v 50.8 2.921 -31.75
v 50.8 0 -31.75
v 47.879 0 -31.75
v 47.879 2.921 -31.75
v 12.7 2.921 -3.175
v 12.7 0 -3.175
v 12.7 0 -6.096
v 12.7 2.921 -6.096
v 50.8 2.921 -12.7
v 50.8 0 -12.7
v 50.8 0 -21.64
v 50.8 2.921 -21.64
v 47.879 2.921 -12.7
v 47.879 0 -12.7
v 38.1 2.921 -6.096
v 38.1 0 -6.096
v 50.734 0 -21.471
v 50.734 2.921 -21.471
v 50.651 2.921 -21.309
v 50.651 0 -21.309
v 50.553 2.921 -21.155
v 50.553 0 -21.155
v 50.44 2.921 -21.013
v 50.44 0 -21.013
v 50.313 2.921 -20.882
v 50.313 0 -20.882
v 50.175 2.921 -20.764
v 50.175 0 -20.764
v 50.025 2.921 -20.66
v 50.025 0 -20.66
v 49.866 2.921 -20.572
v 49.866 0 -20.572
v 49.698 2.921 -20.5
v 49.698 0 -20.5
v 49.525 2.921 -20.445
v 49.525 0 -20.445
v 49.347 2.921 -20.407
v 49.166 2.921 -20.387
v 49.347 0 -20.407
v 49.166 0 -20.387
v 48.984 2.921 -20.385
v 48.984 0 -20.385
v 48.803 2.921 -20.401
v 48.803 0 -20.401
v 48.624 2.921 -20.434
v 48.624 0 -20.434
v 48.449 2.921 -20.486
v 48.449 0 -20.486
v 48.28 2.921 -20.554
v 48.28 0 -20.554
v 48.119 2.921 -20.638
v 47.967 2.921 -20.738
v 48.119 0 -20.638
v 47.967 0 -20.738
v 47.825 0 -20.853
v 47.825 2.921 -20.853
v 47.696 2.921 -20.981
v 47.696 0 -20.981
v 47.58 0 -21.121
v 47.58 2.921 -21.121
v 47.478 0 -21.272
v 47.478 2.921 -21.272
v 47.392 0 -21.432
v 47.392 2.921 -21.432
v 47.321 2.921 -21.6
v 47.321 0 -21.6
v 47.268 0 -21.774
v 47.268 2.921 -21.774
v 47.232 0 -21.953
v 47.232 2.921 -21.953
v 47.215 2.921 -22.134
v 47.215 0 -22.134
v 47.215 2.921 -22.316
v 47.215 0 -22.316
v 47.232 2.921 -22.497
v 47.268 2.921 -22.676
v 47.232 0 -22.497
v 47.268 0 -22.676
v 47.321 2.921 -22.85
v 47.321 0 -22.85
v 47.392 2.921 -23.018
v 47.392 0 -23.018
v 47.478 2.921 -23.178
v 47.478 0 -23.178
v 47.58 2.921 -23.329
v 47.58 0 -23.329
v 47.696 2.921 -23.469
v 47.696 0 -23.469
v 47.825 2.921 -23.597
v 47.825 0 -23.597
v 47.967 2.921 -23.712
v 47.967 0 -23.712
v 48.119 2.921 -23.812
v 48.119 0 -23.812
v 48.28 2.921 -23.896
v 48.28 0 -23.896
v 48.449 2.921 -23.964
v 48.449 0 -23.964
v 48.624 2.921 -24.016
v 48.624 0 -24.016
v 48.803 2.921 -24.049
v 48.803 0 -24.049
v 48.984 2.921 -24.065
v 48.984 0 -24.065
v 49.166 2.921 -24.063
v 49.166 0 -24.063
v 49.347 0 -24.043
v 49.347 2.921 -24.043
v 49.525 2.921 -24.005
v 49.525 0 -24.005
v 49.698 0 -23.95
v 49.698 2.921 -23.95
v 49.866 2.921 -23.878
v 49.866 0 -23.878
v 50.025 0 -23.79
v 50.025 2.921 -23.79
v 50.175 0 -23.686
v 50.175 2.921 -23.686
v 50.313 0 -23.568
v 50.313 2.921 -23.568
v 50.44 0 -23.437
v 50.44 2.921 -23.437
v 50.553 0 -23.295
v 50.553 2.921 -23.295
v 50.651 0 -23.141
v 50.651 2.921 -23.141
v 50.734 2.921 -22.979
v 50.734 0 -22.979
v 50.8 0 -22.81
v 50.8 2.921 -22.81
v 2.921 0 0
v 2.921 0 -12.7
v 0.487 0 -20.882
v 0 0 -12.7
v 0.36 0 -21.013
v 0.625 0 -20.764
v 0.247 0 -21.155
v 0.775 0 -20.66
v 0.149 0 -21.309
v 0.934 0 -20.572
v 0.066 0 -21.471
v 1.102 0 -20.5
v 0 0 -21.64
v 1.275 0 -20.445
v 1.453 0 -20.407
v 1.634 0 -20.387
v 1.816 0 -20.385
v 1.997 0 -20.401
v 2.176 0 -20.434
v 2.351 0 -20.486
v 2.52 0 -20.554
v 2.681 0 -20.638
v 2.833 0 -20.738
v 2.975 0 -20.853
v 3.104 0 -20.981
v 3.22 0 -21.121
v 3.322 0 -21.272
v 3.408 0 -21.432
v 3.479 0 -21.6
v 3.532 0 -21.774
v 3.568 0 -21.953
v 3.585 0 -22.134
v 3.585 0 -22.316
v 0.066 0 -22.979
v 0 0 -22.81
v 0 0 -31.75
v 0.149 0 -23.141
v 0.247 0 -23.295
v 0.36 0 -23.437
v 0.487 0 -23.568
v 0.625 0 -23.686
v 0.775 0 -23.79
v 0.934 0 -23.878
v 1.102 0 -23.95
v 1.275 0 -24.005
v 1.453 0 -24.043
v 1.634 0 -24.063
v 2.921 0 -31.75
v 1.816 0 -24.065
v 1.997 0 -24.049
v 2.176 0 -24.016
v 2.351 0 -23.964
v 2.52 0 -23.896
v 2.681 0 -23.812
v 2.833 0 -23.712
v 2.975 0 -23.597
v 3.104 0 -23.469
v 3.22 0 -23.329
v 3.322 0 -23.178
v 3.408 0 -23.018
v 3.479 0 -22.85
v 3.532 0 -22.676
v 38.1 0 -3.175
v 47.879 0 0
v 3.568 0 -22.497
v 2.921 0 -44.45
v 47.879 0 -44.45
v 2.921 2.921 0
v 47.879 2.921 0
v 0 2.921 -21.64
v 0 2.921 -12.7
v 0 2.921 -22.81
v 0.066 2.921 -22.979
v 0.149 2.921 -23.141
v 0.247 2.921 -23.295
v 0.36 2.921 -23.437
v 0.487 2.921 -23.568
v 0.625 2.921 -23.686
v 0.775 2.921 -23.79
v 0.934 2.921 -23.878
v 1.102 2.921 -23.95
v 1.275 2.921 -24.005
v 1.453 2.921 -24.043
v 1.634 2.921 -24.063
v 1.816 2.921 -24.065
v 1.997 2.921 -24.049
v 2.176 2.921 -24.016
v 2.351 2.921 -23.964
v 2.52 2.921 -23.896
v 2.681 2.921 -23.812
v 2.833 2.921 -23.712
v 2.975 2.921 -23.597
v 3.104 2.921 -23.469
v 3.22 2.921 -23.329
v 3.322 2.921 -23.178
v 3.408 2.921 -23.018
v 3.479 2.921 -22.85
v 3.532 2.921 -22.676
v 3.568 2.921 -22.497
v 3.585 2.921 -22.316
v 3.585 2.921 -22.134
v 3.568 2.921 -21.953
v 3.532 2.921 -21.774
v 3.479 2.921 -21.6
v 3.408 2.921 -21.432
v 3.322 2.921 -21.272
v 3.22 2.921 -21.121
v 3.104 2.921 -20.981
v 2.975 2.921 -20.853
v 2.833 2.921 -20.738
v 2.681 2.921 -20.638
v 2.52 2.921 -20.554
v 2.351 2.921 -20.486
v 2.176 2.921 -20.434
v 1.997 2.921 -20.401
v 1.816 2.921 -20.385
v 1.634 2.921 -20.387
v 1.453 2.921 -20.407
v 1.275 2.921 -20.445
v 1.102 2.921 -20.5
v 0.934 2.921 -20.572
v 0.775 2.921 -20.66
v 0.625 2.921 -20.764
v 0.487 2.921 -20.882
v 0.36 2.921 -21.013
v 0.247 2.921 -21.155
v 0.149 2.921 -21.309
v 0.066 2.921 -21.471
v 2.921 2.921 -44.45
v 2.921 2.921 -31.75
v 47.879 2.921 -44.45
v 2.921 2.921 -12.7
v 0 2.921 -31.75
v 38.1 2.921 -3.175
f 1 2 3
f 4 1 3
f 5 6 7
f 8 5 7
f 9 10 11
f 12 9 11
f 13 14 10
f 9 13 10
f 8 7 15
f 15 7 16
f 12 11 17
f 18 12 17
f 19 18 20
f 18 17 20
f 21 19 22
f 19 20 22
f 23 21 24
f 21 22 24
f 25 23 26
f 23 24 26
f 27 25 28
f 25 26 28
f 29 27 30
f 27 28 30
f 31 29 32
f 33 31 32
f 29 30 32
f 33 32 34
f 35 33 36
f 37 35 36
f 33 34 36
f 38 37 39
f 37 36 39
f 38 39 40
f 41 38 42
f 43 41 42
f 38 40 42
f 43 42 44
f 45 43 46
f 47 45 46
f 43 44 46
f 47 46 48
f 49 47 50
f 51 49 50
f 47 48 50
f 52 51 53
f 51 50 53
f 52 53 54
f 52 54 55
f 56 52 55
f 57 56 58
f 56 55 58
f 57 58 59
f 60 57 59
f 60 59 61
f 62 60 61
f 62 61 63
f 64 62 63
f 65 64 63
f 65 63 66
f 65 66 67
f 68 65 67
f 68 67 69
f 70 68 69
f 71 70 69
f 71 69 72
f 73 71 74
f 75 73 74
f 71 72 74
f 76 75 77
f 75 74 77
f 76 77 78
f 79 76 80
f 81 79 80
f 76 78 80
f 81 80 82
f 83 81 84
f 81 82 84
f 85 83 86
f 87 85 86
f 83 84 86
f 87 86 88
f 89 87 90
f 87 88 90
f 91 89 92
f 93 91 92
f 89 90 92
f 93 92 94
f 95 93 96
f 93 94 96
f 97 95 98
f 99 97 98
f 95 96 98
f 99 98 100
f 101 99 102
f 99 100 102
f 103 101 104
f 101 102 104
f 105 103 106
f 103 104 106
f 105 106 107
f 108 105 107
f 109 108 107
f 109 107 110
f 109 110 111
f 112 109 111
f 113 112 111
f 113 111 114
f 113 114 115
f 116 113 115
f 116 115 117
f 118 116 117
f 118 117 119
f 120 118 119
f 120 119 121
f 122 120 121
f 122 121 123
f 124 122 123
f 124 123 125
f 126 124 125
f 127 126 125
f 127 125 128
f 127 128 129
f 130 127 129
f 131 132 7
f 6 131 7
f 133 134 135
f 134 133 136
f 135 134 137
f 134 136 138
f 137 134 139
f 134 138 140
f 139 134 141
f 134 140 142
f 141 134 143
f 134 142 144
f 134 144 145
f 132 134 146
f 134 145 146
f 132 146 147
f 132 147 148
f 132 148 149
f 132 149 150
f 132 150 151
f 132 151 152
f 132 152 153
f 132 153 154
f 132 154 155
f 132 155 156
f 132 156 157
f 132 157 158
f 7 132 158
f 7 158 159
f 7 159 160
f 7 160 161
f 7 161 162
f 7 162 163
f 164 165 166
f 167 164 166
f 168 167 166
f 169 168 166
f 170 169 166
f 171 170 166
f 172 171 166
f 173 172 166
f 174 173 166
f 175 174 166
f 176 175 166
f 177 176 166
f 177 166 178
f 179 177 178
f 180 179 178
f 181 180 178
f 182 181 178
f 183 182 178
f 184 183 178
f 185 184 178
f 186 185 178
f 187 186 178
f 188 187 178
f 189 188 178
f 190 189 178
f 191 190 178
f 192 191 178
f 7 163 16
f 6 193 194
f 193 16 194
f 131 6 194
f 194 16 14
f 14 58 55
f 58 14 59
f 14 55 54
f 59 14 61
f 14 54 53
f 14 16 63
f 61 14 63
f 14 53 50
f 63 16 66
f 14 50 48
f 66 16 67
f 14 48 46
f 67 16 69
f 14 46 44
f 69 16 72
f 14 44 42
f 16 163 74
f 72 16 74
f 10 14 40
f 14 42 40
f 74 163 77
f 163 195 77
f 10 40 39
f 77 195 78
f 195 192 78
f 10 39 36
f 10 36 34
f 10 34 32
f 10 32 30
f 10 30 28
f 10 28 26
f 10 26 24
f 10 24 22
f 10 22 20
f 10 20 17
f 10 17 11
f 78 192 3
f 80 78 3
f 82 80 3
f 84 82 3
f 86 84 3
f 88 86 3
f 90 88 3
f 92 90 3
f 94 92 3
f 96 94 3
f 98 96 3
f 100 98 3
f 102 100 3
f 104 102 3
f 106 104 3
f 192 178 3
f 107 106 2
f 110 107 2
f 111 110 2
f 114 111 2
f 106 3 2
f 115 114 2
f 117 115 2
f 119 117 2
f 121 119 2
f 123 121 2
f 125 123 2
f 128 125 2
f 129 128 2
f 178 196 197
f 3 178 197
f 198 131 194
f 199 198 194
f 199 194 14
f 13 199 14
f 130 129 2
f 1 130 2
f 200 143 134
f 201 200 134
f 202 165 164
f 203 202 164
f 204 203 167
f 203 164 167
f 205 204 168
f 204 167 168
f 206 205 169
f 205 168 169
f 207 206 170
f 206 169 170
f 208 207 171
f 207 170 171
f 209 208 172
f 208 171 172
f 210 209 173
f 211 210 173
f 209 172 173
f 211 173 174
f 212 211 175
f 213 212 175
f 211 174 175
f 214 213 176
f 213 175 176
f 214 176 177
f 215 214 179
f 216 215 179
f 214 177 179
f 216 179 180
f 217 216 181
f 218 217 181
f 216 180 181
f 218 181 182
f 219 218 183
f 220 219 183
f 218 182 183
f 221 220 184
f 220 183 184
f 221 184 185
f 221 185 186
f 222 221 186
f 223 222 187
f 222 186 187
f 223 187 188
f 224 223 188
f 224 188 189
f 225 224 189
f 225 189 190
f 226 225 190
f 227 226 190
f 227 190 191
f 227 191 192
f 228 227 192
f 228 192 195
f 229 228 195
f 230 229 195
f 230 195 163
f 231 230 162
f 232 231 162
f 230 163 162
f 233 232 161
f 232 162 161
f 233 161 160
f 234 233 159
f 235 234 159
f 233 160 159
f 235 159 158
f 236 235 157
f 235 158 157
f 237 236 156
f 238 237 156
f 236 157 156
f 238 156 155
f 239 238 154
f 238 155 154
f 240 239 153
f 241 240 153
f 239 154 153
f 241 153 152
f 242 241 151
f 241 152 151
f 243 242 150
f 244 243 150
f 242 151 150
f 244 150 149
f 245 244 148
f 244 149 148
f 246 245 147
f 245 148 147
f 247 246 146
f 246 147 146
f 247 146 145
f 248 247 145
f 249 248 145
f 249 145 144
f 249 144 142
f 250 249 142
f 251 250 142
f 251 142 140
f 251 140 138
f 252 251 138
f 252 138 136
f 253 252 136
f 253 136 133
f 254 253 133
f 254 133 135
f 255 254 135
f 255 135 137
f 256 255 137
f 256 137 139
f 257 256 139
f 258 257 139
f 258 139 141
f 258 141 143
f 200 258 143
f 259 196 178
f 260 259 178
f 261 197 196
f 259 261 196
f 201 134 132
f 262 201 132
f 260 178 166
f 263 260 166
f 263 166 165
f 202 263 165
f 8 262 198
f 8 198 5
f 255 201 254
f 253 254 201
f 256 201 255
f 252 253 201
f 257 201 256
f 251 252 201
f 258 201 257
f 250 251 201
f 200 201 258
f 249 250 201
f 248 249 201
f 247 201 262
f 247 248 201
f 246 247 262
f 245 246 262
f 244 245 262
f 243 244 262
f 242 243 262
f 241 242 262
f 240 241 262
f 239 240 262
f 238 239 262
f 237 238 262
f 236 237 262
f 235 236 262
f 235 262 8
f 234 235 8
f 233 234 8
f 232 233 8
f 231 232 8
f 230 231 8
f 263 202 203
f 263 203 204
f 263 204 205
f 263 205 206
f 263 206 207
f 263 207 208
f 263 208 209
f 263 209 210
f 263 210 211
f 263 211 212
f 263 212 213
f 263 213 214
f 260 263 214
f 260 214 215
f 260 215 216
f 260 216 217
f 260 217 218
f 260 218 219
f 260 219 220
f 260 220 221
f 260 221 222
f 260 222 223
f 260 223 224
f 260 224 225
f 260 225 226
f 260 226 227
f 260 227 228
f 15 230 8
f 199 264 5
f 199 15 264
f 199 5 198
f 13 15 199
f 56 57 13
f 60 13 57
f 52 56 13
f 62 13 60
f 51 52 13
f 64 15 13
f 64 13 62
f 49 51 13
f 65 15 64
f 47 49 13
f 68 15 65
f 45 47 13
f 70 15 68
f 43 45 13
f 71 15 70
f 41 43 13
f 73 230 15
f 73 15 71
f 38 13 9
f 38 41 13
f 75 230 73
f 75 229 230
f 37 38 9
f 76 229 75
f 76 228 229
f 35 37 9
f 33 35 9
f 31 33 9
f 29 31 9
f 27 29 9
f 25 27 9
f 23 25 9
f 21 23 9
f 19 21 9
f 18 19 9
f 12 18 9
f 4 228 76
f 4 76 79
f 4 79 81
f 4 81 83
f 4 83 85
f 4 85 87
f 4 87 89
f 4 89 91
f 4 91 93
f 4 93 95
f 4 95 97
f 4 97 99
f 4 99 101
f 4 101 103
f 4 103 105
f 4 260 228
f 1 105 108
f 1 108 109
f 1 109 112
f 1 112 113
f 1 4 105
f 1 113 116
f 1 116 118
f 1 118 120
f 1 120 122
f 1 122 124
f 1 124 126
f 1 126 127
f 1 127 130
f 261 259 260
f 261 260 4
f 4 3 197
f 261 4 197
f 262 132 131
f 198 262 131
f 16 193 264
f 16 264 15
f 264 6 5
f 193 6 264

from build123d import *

# Parameters (mm, degrees)
SKETCH1_W           = 25.4
SKETCH1_H           = 2.921
BOSS_EXTRUDE1_DEPTH = 2.921


with BuildPart() as part:
    # Sketch1 → Boss-Extrude1 (new body)
    with BuildSketch(Plane(origin=(0, 0, 0), x_dir=(1, 0, 0), z_dir=(0, 1, 0))):
        with BuildLine():
            Line((2.921, 0), (47.879, 0))
            Line((47.879, 0), (47.879, 12.7))
            Line((47.879, 12.7), (50.8, 12.7))
            Line((50.8, 12.7), (50.8, 21.640420504))
            ThreePointArc((50.8, 21.640420504), (47.21225, 22.225), (50.8, 22.809579496))
            Line((50.8, 22.809579496), (50.8, 31.75))
            Line((50.8, 31.75), (47.879, 31.75))
            Line((47.879, 31.75), (47.879, 44.45))
            Line((47.879, 44.45), (2.921, 44.45))
            Line((2.921, 44.45), (2.921, 31.75))
            Line((2.921, 31.75), (0, 31.75))
            Line((0, 31.75), (0, 22.809579496))
            ThreePointArc((0, 22.809579496), (3.58775, 22.225), (0, 21.640420504))
            Line((0, 21.640420504), (0, 12.7))
            Line((0, 12.7), (2.921, 12.7))
            Line((2.921, 12.7), (2.921, 0))
        make_face()
        with Locations((25.4, 4.6355)):
            Rectangle(SKETCH1_W, SKETCH1_H, mode=Mode.SUBTRACT)
    extrude(amount=BOSS_EXTRUDE1_DEPTH)


solid = part.part
